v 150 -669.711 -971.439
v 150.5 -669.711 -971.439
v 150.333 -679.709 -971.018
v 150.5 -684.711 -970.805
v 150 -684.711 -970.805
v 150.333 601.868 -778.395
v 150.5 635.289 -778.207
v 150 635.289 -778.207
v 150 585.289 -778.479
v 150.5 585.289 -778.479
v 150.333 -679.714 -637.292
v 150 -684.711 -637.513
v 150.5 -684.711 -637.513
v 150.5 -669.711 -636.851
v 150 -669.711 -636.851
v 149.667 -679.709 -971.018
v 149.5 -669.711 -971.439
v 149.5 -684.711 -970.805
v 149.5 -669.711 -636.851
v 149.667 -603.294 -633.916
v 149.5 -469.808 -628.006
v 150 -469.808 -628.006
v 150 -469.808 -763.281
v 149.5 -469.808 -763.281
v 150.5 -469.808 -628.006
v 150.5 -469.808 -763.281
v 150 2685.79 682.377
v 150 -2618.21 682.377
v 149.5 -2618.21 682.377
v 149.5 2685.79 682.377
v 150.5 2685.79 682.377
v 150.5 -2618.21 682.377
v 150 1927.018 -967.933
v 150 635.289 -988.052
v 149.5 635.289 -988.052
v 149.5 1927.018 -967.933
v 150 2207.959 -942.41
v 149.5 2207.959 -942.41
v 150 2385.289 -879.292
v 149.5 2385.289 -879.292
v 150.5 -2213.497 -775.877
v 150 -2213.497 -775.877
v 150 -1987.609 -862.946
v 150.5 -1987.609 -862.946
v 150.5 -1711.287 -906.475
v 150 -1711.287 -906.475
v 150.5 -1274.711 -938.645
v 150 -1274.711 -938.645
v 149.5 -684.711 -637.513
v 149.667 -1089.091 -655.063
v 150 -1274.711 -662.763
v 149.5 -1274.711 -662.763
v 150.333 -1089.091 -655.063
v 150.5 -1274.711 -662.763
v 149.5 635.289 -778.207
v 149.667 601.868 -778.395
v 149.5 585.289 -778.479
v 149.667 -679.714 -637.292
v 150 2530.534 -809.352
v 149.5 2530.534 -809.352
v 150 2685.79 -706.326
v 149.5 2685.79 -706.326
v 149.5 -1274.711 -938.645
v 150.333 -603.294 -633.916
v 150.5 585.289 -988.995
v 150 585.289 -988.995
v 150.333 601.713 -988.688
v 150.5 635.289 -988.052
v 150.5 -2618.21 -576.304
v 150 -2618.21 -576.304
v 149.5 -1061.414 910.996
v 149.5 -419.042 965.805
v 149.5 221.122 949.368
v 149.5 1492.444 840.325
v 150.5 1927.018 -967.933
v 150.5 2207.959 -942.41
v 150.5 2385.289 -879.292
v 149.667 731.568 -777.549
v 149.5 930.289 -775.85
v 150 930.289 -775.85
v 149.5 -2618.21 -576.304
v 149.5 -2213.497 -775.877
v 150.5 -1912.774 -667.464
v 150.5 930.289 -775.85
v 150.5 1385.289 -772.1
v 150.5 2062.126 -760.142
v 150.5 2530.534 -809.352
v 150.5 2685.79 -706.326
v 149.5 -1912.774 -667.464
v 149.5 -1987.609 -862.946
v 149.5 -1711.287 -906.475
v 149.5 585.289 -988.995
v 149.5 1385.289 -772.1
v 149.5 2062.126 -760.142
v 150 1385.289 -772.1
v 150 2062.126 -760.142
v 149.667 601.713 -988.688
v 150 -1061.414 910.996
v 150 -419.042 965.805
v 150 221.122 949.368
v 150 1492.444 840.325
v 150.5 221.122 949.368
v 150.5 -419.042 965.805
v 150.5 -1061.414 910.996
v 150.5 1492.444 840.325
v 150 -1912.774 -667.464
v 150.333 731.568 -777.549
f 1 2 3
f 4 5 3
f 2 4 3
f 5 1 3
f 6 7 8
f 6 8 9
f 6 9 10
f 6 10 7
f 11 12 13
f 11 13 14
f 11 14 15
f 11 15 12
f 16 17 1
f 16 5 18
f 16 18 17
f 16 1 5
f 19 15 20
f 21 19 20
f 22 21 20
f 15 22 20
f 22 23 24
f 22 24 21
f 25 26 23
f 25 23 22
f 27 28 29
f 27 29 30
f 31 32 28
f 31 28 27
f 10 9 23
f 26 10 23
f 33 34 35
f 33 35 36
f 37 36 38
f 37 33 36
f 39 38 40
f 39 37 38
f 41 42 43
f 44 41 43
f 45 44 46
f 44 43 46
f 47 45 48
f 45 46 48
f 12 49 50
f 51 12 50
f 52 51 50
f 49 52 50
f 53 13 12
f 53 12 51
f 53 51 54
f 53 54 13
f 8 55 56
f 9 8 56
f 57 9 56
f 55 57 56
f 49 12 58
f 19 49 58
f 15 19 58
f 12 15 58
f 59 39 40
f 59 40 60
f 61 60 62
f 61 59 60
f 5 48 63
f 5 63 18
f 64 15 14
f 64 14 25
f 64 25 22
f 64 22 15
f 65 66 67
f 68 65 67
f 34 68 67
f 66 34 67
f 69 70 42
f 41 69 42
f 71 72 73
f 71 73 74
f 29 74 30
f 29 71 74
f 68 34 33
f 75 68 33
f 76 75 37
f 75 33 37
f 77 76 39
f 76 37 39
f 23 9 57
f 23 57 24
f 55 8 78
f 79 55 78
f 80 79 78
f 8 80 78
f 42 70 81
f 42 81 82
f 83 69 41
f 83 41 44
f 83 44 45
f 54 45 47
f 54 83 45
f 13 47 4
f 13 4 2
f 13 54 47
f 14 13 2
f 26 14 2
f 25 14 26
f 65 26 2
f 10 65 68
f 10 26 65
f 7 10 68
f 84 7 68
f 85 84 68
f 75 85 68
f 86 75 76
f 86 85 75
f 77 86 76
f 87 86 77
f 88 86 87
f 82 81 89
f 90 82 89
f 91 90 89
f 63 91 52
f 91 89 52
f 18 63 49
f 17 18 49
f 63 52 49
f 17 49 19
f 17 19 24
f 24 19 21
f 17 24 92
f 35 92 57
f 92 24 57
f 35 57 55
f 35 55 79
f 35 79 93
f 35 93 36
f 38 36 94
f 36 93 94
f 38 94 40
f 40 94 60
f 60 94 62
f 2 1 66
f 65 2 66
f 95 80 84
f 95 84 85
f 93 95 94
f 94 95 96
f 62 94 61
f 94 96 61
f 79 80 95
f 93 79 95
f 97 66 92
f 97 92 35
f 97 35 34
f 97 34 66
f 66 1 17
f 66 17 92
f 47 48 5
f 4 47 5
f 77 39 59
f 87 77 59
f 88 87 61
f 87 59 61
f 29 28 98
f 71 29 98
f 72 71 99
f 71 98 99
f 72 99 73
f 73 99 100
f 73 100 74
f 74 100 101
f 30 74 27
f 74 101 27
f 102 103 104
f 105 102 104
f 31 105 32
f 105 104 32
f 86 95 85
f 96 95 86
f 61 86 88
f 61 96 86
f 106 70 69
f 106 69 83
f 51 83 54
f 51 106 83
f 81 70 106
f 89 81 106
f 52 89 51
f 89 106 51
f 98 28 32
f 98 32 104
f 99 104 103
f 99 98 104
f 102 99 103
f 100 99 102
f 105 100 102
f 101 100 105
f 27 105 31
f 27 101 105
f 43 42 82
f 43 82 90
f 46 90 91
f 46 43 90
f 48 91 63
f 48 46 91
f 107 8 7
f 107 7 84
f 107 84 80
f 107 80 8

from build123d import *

# Parameters (mm, degrees)
F2_DEPTH = 0.5


with BuildPart() as f2:
    # F1 (on offset) → F2 (new body, symmetric)
    with BuildSketch(Plane.YZ.offset(150)):
        with BuildLine():
            add(Edge.make_bspline(
                [(-2618.2102647118, -576.3037851779), (-2539.0333905021, -590.5693602499), (-2375.154011412, -620.0960826442), (-2096.7040136344, -670.0811240284), (-1773.0350855243, -710.4396632339), (-1504.9471650603, -727.0489500896), (-1286.513021344, -736.293041033), (-1274.7112617183, -736.7843373728)],
                knots=[0, 0, 0, 0, 0.0701169764, 0.1451273073, 0.2240791994, 0.3224669769, 0.3279987799, 0.3279987799, 0.3279987799, 0.3279987799], degree=3))
            Line((-1274.7112617184, -736.7843373728), (-1274.7112617184, -662.7631248578))
            add(Edge.make_bspline(
                [(-2618.2102647118, -576.3037851779), (-2374.7002828416, -614.2741342573), (-1917.2879605014, -685.5956944009), (-1551.0225985173, -673.7788376752), (-1310.41197081, -664.2083344144), (-1274.7112617184, -662.7631248578)],
                knots=[0, 0, 0, 0, 0.3315668647, 0.6228194025, 0.6719076149, 0.6719076149, 0.6719076149, 0.6719076149], degree=3))
        make_face()
        with BuildLine():
            add(Edge.make_bspline(
                [(-669.7112617185, -757.6052229188), (-602.0714093195, -759.6035889936), (-534.9526120868, -761.5040851665), (-469.8083181867, -763.2811623211)],
                knots=[0.4110522857, 0.4110522857, 0.4110522857, 0.4110522857, 0.4376310669, 0.4376310669, 0.4376310669, 0.4376310669], degree=3))
            Line((-469.8083181867, -763.281162321), (-469.8083181867, -628.0062858085))
            add(Edge.make_bspline(
                [(-669.7112617184, -636.8509449902), (-603.4673012103, -633.9274703809), (-536.6378166673, -630.9664971881), (-469.8083181867, -628.0062858085)],
                knots=[0.9225616639, 0.9225616639, 0.9225616639, 0.9225616639, 1, 1, 1, 1], degree=3))
            Line((-669.7112617184, -636.8509449902), (-669.7112617184, -757.6052229188))
        make_face()
        with BuildLine():
            add(Edge.make_bspline(
                [(1385.2887382816, -772.0995976401), (1632.162088344, -770.4906352796), (2047.3542309509, -768.0664997186), (2363.6699111594, -735.5275467967), (2579.3131378684, -715.9783442912), (2685.7897352882, -706.3256758723)],
                knots=[0.7310429993, 0.7310429993, 0.7310429993, 0.7310429993, 0.8392479794, 0.9206266367, 1, 1, 1, 1], degree=3))
            Line((1385.2887382816, -772.0995976401), (1385.2887382816, -924.43752621))
            Line((1385.2887382816, -924.43752621), (1606.0147852981, -919.6427484052))
            Line((1606.0147852981, -919.6427484052), (2063.3390255537, -909.2374018513))
            Line((2063.3390255537, -909.2374018513), (2385.2887382816, -879.2924956671))
            add(Edge.make_bspline(
                [(2385.2887382816, -879.2924956671), (2421.9290941285, -864.0432321069), (2534.0158071069, -814.3437931642), (2626.4106873664, -748.585983947), (2685.7897352882, -706.3256758723)],
                knots=[0.9203688542, 0.9203688542, 0.9203688542, 0.9203688542, 0.9488237702, 1, 1, 1, 1], degree=3))
        make_face()
        with BuildLine():
            Line((-1274.7112617184, -938.6454548407), (-1274.7112617184, -880.009493909))
            Line((-1274.7112617184, -880.009493909), (-1437.7513832902, -867.8795826768))
            Line((-1437.7513832902, -867.8795826768), (-1847.0462813249, -827.756598687))
            Line((-1847.0462813249, -827.756598687), (-2213.4968429981, -775.8774304832))
            add(Edge.make_bspline(
                [(-2213.4968429981, -775.8774304832), (-2178.1828741936, -792.5093882206), (-2116.1479783538, -820.1222288889), (-2018.4522131173, -857.0758458758), (-1898.8982328104, -883.9924256255), (-1734.0059514115, -905.8160057723), (-1550.3892671083, -920.6455663407), (-1351.9697174508, -933.7750206565), (-1274.7112617184, -938.6454548407)],
                knots=[0.106161225, 0.106161225, 0.106161225, 0.106161225, 0.1392434105, 0.174518325, 0.212295922, 0.2554875511, 0.3106744158, 0.3428881723, 0.3428881723, 0.3428881723, 0.3428881723], degree=3))
        make_face()
        with BuildLine():
            Line((1606.0147852981, -919.6427484052), (1385.2887382816, -924.43752621))
            Line((1385.2887382816, -924.43752621), (1385.2887382816, -976.6713911922))
            add(Edge.make_bspline(
                [(1385.2887382816, -976.6713911922), (1557.8524568737, -974.3902477766), (1874.8816200544, -970.1108659298), (2023.0516705268, -965.2174725682), (2132.8649293631, -954.1700096304), (2234.8657137087, -940.0665287928), (2295.6269129834, -915.1532376729), (2358.8355305535, -890.3019940013), (2385.2887382816, -879.2924956671)],
                knots=[0.6984519453, 0.6984519453, 0.6984519453, 0.6984519453, 0.7496741382, 0.7992883896, 0.8337188547, 0.8677428923, 0.8998252818, 0.9203688542, 0.9203688542, 0.9203688542, 0.9203688542], degree=3))
            Line((2385.2887382816, -879.2924956671), (2063.3390255537, -909.2374018513))
            Line((2063.3390255537, -909.2374018513), (1606.0147852981, -919.6427484052))
        make_face()
        with BuildLine():
            Line((-1274.7112617184, -880.009493909), (-1274.7112617184, -736.7843373728))
            add(Edge.make_bspline(
                [(-2618.2102647118, -576.3037851779), (-2539.0333905021, -590.5693602499), (-2375.154011412, -620.0960826442), (-2096.7040136344, -670.0811240284), (-1773.0350855243, -710.4396632339), (-1504.9471650603, -727.0489500896), (-1286.513021344, -736.293041033), (-1274.7112617183, -736.7843373728)],
                knots=[0, 0, 0, 0, 0.0701169764, 0.1451273073, 0.2240791994, 0.3224669769, 0.3279987799, 0.3279987799, 0.3279987799, 0.3279987799], degree=3))
            add(Edge.make_bspline(
                [(-2618.2102647118, -576.3037851779), (-2555.0916094041, -607.4863736106), (-2428.5667711769, -669.9935980991), (-2279.6156710071, -744.5400580991), (-2218.8240651697, -773.368447862), (-2213.4968429981, -775.8774304832)],
                knots=[0, 0, 0, 0, 0.050470382, 0.1011706743, 0.106161225, 0.106161225, 0.106161225, 0.106161225], degree=3))
            Line((-2213.4968429981, -775.8774304832), (-1847.0462813249, -827.756598687))
            Line((-1847.0462813249, -827.756598687), (-1437.7513832902, -867.8795826768))
            Line((-1437.7513832902, -867.8795826768), (-1274.7112617184, -880.009493909))
        make_face()
        with BuildLine():
            add(Edge.make_bspline(
                [(-1274.7112617183, -736.7843373728), (-1101.7111468682, -743.9861721753), (-891.285948131, -751.0201450743), (-684.7112617185, -757.1607021541)],
                knots=[0.3279987799, 0.3279987799, 0.3279987799, 0.3279987799, 0.4090885986, 0.4090885986, 0.4090885986, 0.4090885986], degree=3))
            Line((-684.7112617184, -757.1607021541), (-684.7112617184, -637.5127192401))
            add(Edge.make_bspline(
                [(-1274.7112617184, -662.7631248578), (-1096.670228969, -655.5558001701), (-893.8375195181, -646.7360757099), (-684.7112617184, -637.5127192401)],
                knots=[0.6719076149, 0.6719076149, 0.6719076149, 0.6719076149, 0.9167127252, 0.9167127252, 0.9167127252, 0.9167127252], degree=3))
            Line((-1274.7112617184, -662.7631248578), (-1274.7112617184, -736.7843373728))
        make_face()
        with BuildLine():
            add(Edge.make_bspline(
                [(-684.7112617185, -757.1607021541), (-679.7088083003, -757.3094030975), (-674.7086129159, -757.4575801203), (-669.7112617185, -757.6052229188)],
                knots=[0.4090885986, 0.4090885986, 0.4090885986, 0.4090885986, 0.4110522857, 0.4110522857, 0.4110522857, 0.4110522857], degree=3))
            Line((-669.7112617184, -757.6052229188), (-669.7112617184, -636.8509449902))
            add(Edge.make_bspline(
                [(-684.7112617184, -637.5127192401), (-679.7147702212, -637.2923527368), (-674.714686125, -637.0717558249), (-669.7112617184, -636.8509449902)],
                knots=[0.9167127252, 0.9167127252, 0.9167127252, 0.9167127252, 0.9225616639, 0.9225616639, 0.9225616639, 0.9225616639], degree=3))
            Line((-684.7112617184, -637.5127192401), (-684.7112617184, -757.1607021541))
        make_face()
        with BuildLine():
            add(Edge.make_bspline(
                [(-44.7112617184, -773.728421124), (113.2613740111, -776.9774103479), (302.2012598236, -779.359672084), (525.4456674629, -778.7711649103), (585.2887382816, -778.479479658)],
                knots=[0.5022157887, 0.5022157887, 0.5022157887, 0.5022157887, 0.5835751742, 0.6121720276, 0.6121720276, 0.6121720276, 0.6121720276], degree=3))
            Line((-44.7112617184, -773.728421124), (-44.7112617184, -941.6859116845))
            Line((-44.7112617184, -941.6859116845), (-39.9646897602, -941.8767564059))
            Line((-39.9646897602, -941.8767564059), (582.4794109707, -941.8767564059))
            Line((582.4794109707, -941.8767564059), (585.2887382816, -941.8157300775))
            Line((585.2887382816, -941.8157300775), (585.2887382816, -778.479479658))
        make_face()
        with BuildLine():
            add(Edge.make_bspline(
                [(585.2887382816, -778.479479658), (601.8230858905, -778.3988884503), (618.4935316161, -778.30771442), (635.2887382816, -778.2072718216)],
                knots=[0.6121720276, 0.6121720276, 0.6121720276, 0.6121720276, 0.6200731983, 0.6200731983, 0.6200731983, 0.6200731983], degree=3))
            Line((585.2887382816, -778.479479658), (585.2887382816, -941.8157300775))
            Line((585.2887382816, -941.8157300775), (635.2887382816, -940.7295923358))
            Line((635.2887382816, -940.7295923358), (635.2887382816, -778.2072718216))
        make_face()
        with BuildLine():
            add(Edge.make_bspline(
                [(635.2887382816, -778.2072718216), (730.3128033462, -777.6389868226), (829.3305657081, -776.77400756), (930.2887382816, -775.8503599419)],
                knots=[0.6200731983, 0.6200731983, 0.6200731983, 0.6200731983, 0.6647765097, 0.6647765097, 0.6647765097, 0.6647765097], degree=3))
            Line((635.2887382816, -778.2072718216), (635.2887382816, -940.7295923358))
            Line((635.2887382816, -940.7295923358), (930.2887382816, -934.3213796596))
            Line((930.2887382816, -934.3213796596), (930.2887382816, -775.8503599419))
        make_face()
        with BuildLine():
            add(Edge.make_bspline(
                [(930.2887382816, -775.8503599419), (1044.3424127047, -774.8069040032), (1197.2484628803, -773.339475374), (1349.3212311725, -772.3340108123), (1385.2887382816, -772.0995976401)],
                knots=[0.6647765097, 0.6647765097, 0.6647765097, 0.6647765097, 0.715278384, 0.7310429993, 0.7310429993, 0.7310429993, 0.7310429993], degree=3))
            Line((930.2887382816, -775.8503599419), (930.2887382816, -934.3213796596))
            Line((930.2887382816, -934.3213796596), (1385.2887382816, -924.43752621))
            Line((1385.2887382816, -924.43752621), (1385.2887382816, -772.0995976401))
        make_face()
        with BuildLine():
            Line((-684.7112617184, -970.8046369417), (-684.7112617184, -915.9535257059))
            Line((-684.7112617184, -915.9535257059), (-917.2539962014, -906.603714143))
            Line((-917.2539962014, -906.603714143), (-1274.7112617184, -880.009493909))
            Line((-1274.7112617184, -880.009493909), (-1274.7112617184, -938.6454548407))
            add(Edge.make_bspline(
                [(-1274.7112617184, -938.6454548407), (-1151.7496419929, -946.3970526479), (-933.6634273917, -959.1977316743), (-753.7427084976, -967.8564883836), (-684.7112617184, -970.8046369416)],
                knots=[0.3428881723, 0.3428881723, 0.3428881723, 0.3428881723, 0.394158362, 0.4266982769, 0.4266982769, 0.4266982769, 0.4266982769], degree=3))
        make_face()
        with BuildLine():
            Line((-669.7112617184, -971.4392812777), (-669.7112617184, -916.5566285022))
            Line((-669.7112617184, -916.5566285022), (-684.7112617184, -915.9535257059))
            Line((-684.7112617184, -915.9535257059), (-684.7112617184, -970.8046369417))
            add(Edge.make_bspline(
                [(-684.7112617184, -970.8046369416), (-679.7075573577, -971.0183317791), (-674.7081830744, -971.2298531452), (-669.7112617184, -971.4392812777)],
                knots=[0.4266982769, 0.4266982769, 0.4266982769, 0.4266982769, 0.4290569137, 0.4290569137, 0.4290569137, 0.4290569137], degree=3))
        make_face()
        with BuildLine():
            Line((-44.7112617184, -989.2742923513), (-44.7112617184, -941.6859116845))
            Line((-44.7112617184, -941.6859116845), (-669.7112617184, -916.5566285022))
            Line((-669.7112617184, -916.5566285022), (-669.7112617184, -971.4392812777))
            add(Edge.make_bspline(
                [(-669.7112617184, -971.4392812777), (-579.109241688, -975.2365417312), (-393.0716362982, -981.6779466746), (-162.4671889977, -987.2184957479), (-44.7112617184, -989.2742923513)],
                knots=[0.4290569137, 0.4290569137, 0.4290569137, 0.4290569137, 0.4718226984, 0.5176586181, 0.5176586181, 0.5176586181, 0.5176586181], degree=3))
        make_face()
        with BuildLine():
            Line((-39.9646897602, -941.8767564059), (-44.7112617184, -941.6859116845))
            Line((-44.7112617184, -941.6859116845), (-44.7112617184, -989.2742923513))
            add(Edge.make_bspline(
                [(-44.7112617184, -989.2742923513), (63.510492238, -991.1636402537), (296.9511627935, -993.7941239946), (474.3464232517, -991.0545907571), (585.2887382816, -988.9950215944)],
                knots=[0.5176586181, 0.5176586181, 0.5176586181, 0.5176586181, 0.5597834074, 0.6096308473, 0.6096308473, 0.6096308473, 0.6096308473], degree=3))
            Line((585.2887382816, -988.9950215944), (585.2887382816, -941.8157300775))
            Line((585.2887382816, -941.8157300775), (582.4794109707, -941.8767564059))
            Line((582.4794109707, -941.8767564059), (-39.9646897602, -941.8767564059))
        make_face()
        with BuildLine():
            Line((635.2887382816, -940.7295923358), (585.2887382816, -941.8157300775))
            Line((585.2887382816, -941.8157300775), (585.2887382816, -988.9950215944))
            add(Edge.make_bspline(
                [(585.2887382816, -988.9950215944), (601.602327556, -988.6921708256), (618.235863852, -988.3768917606), (635.2887382816, -988.0523722636)],
                knots=[0.6096308473, 0.6096308473, 0.6096308473, 0.6096308473, 0.6169606985, 0.6169606985, 0.6169606985, 0.6169606985], degree=3))
            Line((635.2887382816, -988.0523722636), (635.2887382816, -940.7295923358))
        make_face()
        with BuildLine():
            Line((930.2887382816, -934.3213796596), (635.2887382816, -940.7295923358))
            Line((635.2887382816, -940.7295923358), (635.2887382816, -988.0523722636))
            add(Edge.make_bspline(
                [(635.2887382816, -988.0523722636), (689.5565391928, -987.0196455216), (780.6034531895, -985.2671450814), (889.6869238697, -983.5368188605), (930.2887382816, -982.9222818723)],
                knots=[0.6169606985, 0.6169606985, 0.6169606985, 0.6169606985, 0.6402866725, 0.6532552442, 0.6532552442, 0.6532552442, 0.6532552442], degree=3))
            Line((930.2887382816, -982.9222818723), (930.2887382816, -934.3213796596))
        make_face()
        with BuildLine():
            Line((1385.2887382816, -924.43752621), (930.2887382816, -934.3213796596))
            Line((930.2887382816, -934.3213796596), (930.2887382816, -982.9222818723))
            add(Edge.make_bspline(
                [(930.2887382816, -982.9222818723), (1071.7899085728, -980.7805622405), (1233.0244487495, -978.6841936767), (1385.2887382816, -976.6713911922)],
                knots=[0.6532552442, 0.6532552442, 0.6532552442, 0.6532552442, 0.6984519453, 0.6984519453, 0.6984519453, 0.6984519453], degree=3))
            Line((1385.2887382816, -976.6713911922), (1385.2887382816, -924.43752621))
        make_face()
        with BuildLine():
            add(Edge.make_bspline(
                [(-469.8083181867, -763.2811623211), (-396.2635821108, -765.2873959064), (-243.3837676729, -769.267005864), (-111.8512497035, -772.3475674309), (-44.7112617184, -773.728421124)],
                knots=[0.4376310669, 0.4376310669, 0.4376310669, 0.4376310669, 0.4676372167, 0.5022157887, 0.5022157887, 0.5022157887, 0.5022157887], degree=3))
            add(Edge.make_bspline(
                [(-669.7112617185, -757.6052229188), (-602.0714093195, -759.6035889936), (-534.9526120868, -761.5040851665), (-469.8083181867, -763.2811623211)],
                knots=[0.4110522857, 0.4110522857, 0.4110522857, 0.4110522857, 0.4376310669, 0.4376310669, 0.4376310669, 0.4376310669], degree=3))
            Line((-669.7112617184, -757.6052229188), (-669.7112617184, -916.5566285022))
            Line((-669.7112617184, -916.5566285022), (-44.7112617184, -941.6859116845))
            Line((-44.7112617184, -941.6859116845), (-44.7112617184, -773.728421124))
        make_face()
        with BuildLine():
            Line((-684.7112617184, -915.9535257059), (-684.7112617184, -757.1607021541))
            add(Edge.make_bspline(
                [(-1274.7112617183, -736.7843373728), (-1101.7111468682, -743.9861721753), (-891.285948131, -751.0201450743), (-684.7112617185, -757.1607021541)],
                knots=[0.3279987799, 0.3279987799, 0.3279987799, 0.3279987799, 0.4090885986, 0.4090885986, 0.4090885986, 0.4090885986], degree=3))
            Line((-1274.7112617184, -736.7843373728), (-1274.7112617184, -880.009493909))
            Line((-1274.7112617184, -880.009493909), (-917.2539962014, -906.603714143))
            Line((-917.2539962014, -906.603714143), (-684.7112617184, -915.9535257059))
        make_face()
        with BuildLine():
            Line((-669.7112617184, -916.5566285022), (-669.7112617184, -757.6052229188))
            add(Edge.make_bspline(
                [(-684.7112617185, -757.1607021541), (-679.7088083003, -757.3094030975), (-674.7086129159, -757.4575801203), (-669.7112617185, -757.6052229188)],
                knots=[0.4090885986, 0.4090885986, 0.4090885986, 0.4090885986, 0.4110522857, 0.4110522857, 0.4110522857, 0.4110522857], degree=3))
            Line((-684.7112617184, -757.1607021541), (-684.7112617184, -915.9535257059))
            Line((-684.7112617184, -915.9535257059), (-669.7112617184, -916.5566285022))
        make_face()
    extrude(amount=F2_DEPTH, both=True)


with BuildPart() as f2b:
    # F1 (on offset) → F2, piece 2 (new body, symmetric)
    with BuildSketch(Plane.YZ.offset(150)):
        with BuildLine():
            add(Edge.make_bspline(
                [(-2618.2102647118, 682.377471705), (-2425.4264858269, 707.5988526014), (-2025.1400694407, 754.786187921), (-1246.719628274, 884.3212729298), (-933.9907816463, 930.271565146), (-658.0908901248, 956.2238691824), (-429.7030529129, 965.9828540847), (-170.6925237797, 972.981069615), (865.2458955876, 916.0169063496), (1722.6619630852, 814.0140684372), (2353.5623468111, 730.2220049375), (2685.7897352882, 682.377471705)],
                knots=[0, 0, 0, 0, 0.1177012003, 0.2503301042, 0.3354847944, 0.4128970602, 0.482513794, 0.5579741733, 0.7087126641, 0.8527261185, 1, 1, 1, 1], degree=3))
            Line((-2618.2102647118, 682.377471705), (2685.7897352882, 682.377471705))
        make_face()
    extrude(amount=F2_DEPTH, both=True)


solid = Compound([f2.part, f2b.part])
